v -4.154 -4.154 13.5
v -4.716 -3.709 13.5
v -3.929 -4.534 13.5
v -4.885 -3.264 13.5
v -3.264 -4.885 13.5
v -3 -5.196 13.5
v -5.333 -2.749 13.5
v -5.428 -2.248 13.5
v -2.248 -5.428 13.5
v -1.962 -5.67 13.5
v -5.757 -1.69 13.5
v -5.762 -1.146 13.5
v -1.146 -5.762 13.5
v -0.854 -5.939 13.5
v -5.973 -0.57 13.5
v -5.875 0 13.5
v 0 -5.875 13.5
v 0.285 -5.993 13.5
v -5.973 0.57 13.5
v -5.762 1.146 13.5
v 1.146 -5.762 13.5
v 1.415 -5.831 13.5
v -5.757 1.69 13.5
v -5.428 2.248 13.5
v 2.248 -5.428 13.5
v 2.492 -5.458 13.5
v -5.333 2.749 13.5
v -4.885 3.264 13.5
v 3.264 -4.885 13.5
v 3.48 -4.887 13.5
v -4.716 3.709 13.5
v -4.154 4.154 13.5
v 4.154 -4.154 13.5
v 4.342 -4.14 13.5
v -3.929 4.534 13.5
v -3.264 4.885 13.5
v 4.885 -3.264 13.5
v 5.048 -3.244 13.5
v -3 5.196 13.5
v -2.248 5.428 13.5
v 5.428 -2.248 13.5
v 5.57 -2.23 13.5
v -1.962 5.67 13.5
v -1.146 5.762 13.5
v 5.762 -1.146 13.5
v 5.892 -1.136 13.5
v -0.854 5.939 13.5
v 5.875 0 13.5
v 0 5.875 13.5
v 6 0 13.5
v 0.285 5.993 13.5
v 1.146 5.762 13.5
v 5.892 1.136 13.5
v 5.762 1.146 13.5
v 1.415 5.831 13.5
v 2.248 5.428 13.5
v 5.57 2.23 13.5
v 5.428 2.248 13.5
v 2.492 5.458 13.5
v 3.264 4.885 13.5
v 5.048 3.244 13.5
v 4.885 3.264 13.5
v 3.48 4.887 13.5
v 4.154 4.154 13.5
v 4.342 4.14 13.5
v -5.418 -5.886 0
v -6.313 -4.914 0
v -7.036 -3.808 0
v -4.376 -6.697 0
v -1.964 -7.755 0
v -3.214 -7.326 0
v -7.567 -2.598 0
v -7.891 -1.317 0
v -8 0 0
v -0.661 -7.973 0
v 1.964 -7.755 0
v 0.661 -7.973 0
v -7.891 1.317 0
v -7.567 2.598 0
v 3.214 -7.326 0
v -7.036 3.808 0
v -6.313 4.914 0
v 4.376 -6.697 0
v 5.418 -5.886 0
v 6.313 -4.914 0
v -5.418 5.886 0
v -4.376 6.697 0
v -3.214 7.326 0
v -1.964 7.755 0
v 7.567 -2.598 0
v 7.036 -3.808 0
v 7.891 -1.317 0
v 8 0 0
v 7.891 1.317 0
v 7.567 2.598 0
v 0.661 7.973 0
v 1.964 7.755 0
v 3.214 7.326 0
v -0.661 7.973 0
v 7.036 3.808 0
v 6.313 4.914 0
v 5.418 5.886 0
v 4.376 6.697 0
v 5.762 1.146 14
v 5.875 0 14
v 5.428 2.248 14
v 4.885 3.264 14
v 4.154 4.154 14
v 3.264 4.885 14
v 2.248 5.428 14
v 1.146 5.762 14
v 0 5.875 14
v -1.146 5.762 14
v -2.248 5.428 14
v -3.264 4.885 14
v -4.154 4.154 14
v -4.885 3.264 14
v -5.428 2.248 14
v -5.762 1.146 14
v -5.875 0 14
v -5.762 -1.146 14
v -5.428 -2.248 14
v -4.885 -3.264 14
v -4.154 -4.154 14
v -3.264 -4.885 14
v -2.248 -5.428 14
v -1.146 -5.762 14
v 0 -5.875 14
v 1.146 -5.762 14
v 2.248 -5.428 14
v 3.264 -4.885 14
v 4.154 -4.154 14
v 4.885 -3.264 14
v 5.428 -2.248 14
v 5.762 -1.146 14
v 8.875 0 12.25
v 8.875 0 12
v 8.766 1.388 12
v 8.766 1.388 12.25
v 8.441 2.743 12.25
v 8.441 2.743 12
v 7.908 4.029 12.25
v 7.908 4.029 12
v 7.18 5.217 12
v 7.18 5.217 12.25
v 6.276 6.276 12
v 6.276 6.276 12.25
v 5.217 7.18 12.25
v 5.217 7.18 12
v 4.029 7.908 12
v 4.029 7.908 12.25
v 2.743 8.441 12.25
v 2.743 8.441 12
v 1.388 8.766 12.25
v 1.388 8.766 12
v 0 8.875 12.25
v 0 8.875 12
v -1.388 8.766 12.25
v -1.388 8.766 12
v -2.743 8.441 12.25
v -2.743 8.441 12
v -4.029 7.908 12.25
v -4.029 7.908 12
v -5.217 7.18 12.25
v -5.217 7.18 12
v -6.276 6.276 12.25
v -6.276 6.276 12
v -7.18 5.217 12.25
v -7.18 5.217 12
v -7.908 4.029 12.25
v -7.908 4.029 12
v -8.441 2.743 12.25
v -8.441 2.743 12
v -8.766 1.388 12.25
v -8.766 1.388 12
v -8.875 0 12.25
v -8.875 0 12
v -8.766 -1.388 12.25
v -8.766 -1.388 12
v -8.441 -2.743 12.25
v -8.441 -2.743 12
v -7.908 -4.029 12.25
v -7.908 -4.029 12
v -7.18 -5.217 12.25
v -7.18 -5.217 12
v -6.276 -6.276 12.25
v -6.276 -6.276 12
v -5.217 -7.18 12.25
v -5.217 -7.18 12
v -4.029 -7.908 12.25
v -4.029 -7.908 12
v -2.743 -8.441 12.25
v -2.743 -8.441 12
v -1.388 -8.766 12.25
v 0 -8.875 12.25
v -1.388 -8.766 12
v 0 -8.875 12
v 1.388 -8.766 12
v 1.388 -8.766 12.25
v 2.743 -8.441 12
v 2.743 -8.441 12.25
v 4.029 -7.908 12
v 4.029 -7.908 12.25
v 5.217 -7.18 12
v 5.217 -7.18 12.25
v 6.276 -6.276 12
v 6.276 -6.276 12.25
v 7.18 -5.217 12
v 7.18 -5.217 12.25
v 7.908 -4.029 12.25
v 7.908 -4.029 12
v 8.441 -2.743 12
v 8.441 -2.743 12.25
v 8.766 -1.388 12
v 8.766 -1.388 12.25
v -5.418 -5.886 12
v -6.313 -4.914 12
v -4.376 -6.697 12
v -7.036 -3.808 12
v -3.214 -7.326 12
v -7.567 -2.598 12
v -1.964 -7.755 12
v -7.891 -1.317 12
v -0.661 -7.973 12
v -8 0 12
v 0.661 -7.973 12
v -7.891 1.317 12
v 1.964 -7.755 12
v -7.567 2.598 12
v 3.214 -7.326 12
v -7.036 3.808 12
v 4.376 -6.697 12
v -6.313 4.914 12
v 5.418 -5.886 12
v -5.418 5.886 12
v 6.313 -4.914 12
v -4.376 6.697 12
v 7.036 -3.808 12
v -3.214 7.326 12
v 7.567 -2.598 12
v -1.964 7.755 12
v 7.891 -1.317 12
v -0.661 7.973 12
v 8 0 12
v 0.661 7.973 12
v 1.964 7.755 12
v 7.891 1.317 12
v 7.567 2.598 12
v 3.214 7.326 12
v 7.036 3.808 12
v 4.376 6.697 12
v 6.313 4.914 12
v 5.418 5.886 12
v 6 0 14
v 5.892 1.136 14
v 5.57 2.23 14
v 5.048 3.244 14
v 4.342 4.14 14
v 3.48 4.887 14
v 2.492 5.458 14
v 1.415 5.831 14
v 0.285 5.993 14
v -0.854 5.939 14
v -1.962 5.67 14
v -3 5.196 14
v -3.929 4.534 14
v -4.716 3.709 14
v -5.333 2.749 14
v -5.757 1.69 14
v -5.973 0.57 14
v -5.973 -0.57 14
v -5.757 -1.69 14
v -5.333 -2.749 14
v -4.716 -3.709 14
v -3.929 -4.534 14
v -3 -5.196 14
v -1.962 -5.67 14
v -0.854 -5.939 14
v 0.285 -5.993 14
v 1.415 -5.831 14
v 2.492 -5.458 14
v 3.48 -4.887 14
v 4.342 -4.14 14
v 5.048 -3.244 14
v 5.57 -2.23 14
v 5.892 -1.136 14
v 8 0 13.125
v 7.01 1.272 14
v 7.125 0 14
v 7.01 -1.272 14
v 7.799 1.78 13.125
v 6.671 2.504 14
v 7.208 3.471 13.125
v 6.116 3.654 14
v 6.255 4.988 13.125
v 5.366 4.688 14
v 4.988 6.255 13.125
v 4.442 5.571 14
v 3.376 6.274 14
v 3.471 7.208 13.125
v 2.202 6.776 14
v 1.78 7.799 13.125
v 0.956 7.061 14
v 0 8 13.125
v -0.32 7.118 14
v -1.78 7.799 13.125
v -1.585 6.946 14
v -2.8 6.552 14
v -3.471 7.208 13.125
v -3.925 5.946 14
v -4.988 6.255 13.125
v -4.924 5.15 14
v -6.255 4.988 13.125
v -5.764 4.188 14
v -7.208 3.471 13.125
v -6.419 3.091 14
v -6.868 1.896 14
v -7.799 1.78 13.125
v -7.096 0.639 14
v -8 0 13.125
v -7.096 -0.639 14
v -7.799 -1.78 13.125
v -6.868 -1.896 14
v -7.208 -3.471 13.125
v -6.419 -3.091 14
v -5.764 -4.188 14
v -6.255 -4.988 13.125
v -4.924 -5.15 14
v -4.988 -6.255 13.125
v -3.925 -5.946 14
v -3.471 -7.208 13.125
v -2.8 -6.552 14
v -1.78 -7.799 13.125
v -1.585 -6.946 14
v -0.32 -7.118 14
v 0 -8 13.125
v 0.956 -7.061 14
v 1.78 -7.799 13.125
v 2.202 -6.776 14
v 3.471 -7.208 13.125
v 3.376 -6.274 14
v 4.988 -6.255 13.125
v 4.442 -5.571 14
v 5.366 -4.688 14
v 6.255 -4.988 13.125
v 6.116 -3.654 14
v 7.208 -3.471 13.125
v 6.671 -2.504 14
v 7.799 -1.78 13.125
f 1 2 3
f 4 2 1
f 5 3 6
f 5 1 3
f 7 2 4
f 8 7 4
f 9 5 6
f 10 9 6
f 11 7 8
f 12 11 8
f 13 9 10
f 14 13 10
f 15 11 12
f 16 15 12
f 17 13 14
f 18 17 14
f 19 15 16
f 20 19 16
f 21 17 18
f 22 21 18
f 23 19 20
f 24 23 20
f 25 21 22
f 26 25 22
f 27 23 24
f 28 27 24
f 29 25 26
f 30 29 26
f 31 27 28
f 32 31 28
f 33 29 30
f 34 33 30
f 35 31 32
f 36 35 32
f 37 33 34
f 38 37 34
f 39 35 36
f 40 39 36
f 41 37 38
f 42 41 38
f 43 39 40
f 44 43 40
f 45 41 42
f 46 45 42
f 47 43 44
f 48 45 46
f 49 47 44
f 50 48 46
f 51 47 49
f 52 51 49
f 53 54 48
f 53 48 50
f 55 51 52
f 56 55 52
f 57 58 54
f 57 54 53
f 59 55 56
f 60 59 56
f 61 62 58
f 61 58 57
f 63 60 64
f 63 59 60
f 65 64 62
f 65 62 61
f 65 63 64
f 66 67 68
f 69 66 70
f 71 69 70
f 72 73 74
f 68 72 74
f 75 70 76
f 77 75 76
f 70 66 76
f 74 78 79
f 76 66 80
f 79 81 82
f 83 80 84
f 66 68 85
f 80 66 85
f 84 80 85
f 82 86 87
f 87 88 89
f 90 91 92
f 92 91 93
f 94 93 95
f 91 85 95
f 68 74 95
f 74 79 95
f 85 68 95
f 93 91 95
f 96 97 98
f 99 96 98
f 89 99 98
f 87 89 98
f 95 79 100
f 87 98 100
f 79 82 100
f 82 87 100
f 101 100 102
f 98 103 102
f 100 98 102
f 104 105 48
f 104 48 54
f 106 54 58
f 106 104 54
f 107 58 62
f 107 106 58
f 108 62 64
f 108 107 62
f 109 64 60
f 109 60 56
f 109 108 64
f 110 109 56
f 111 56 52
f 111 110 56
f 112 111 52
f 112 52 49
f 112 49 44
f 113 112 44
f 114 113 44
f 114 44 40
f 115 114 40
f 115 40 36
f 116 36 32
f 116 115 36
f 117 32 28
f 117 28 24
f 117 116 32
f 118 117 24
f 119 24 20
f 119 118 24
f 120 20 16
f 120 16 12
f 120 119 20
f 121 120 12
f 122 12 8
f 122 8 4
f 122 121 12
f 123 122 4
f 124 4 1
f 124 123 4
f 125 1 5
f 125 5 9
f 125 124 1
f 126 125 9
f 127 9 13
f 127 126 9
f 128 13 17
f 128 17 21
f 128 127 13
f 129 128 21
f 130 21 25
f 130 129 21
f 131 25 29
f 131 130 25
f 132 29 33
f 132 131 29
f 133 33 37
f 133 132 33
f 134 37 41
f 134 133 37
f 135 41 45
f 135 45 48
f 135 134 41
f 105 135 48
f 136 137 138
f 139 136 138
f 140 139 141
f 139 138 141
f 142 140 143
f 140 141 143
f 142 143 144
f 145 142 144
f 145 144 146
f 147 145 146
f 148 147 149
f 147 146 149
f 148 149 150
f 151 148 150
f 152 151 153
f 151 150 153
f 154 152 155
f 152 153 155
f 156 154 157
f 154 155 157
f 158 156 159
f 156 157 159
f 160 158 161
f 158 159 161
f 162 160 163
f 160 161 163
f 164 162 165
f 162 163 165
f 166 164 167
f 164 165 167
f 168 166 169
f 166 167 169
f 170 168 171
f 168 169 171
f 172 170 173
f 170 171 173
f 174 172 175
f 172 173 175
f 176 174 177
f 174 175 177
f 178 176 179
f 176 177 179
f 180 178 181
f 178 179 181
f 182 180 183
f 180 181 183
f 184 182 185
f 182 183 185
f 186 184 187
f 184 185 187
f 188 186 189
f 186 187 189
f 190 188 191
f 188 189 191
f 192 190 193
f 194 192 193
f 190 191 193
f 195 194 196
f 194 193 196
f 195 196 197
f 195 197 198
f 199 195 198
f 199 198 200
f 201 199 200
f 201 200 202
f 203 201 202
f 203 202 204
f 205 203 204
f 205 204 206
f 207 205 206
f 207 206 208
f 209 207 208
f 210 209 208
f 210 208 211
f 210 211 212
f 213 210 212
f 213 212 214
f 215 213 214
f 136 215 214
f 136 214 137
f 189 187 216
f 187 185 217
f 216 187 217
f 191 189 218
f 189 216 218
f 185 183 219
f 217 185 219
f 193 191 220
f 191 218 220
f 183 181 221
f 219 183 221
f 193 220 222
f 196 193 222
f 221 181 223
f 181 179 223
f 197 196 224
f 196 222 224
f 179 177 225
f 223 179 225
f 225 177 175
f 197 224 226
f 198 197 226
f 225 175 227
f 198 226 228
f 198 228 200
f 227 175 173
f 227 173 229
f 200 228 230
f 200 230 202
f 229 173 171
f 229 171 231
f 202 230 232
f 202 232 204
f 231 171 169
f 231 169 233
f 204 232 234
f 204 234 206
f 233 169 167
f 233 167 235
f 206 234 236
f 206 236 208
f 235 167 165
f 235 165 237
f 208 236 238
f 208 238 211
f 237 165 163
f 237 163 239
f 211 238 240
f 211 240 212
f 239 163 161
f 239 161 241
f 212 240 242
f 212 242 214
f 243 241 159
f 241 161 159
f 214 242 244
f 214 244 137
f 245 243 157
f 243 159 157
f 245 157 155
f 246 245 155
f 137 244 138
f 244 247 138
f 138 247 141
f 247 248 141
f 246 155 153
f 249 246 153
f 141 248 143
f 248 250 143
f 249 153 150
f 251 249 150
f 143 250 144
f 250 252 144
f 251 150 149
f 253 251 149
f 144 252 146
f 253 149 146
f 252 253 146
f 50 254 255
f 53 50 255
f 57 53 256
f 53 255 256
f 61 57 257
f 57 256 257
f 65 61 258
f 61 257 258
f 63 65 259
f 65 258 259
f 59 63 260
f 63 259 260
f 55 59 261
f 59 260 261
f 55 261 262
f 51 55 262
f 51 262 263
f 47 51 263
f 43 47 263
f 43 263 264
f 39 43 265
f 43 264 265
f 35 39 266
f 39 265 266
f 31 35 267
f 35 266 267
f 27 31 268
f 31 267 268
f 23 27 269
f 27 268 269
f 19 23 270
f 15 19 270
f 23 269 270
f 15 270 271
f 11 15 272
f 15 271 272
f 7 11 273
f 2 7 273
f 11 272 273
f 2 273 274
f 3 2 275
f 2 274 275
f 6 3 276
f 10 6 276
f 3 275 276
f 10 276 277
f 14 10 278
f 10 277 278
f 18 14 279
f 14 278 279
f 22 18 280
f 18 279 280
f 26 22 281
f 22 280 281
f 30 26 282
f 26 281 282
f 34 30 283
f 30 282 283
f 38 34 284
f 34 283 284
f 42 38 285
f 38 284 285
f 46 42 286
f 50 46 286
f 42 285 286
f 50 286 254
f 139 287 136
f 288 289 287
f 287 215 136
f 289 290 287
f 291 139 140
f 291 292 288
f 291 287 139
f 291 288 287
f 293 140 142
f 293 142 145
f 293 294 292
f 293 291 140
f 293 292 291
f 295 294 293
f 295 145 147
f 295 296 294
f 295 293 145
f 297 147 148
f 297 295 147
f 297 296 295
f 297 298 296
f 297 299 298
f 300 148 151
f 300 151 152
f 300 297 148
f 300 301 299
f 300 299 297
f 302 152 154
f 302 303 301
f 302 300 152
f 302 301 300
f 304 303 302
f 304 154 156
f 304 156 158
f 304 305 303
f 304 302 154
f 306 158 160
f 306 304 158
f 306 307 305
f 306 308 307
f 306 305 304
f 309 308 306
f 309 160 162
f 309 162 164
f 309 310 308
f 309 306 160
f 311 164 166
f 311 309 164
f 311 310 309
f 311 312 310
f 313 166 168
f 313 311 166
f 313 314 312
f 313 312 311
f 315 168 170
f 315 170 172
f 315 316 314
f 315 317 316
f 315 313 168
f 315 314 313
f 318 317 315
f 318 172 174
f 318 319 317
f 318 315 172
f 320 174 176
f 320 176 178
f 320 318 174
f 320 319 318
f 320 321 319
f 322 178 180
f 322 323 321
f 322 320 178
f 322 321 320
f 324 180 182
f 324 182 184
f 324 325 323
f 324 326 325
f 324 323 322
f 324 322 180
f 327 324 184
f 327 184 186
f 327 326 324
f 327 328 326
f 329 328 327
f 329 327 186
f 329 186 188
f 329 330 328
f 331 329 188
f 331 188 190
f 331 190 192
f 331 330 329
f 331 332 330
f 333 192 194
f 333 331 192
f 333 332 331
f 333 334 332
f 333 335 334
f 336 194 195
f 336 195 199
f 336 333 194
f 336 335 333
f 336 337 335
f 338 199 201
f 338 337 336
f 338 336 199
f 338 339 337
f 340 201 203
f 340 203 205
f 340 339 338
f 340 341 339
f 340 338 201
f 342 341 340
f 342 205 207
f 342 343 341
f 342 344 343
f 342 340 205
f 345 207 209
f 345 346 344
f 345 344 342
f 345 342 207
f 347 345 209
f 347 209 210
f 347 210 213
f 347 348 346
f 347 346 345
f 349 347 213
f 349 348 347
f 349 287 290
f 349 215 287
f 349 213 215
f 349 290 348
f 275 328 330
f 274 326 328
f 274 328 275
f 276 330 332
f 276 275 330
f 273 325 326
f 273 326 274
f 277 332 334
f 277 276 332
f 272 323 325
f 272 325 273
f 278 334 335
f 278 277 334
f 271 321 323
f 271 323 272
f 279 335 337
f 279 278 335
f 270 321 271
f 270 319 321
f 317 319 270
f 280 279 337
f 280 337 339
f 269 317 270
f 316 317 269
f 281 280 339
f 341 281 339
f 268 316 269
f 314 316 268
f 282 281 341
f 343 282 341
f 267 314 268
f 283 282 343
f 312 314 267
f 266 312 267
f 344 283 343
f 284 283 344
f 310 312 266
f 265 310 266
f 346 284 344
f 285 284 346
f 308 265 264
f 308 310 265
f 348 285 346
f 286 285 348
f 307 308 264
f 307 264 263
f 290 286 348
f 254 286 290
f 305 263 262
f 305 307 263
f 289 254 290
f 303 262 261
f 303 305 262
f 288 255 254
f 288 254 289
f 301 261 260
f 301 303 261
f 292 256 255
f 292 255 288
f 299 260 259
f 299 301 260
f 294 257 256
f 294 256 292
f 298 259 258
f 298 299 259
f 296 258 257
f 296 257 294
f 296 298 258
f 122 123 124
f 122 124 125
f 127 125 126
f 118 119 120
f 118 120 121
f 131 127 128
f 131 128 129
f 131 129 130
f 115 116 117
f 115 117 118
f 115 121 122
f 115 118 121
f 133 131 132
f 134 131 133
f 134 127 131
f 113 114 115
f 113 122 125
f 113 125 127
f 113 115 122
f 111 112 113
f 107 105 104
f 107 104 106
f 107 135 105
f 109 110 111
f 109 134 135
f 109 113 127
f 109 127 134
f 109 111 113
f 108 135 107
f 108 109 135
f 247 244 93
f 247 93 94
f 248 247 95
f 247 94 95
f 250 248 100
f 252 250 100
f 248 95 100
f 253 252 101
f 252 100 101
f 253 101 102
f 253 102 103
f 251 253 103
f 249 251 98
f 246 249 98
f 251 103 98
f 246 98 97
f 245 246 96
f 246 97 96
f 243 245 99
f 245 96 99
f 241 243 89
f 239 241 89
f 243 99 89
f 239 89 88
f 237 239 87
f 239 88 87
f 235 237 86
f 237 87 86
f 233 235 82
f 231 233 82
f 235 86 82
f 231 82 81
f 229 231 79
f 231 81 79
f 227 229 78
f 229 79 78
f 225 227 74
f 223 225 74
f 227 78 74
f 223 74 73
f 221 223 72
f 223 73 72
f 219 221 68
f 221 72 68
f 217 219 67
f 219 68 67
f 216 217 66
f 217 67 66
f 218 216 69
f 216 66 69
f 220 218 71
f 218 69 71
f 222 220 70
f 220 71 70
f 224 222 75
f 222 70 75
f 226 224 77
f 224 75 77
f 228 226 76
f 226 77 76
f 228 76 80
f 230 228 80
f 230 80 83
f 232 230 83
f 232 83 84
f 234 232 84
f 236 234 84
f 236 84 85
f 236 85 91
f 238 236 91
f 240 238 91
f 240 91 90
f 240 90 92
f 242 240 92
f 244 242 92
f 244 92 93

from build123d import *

# Parameters (mm, degrees)
F0_R     = 8
F1_DEPTH = 12
F2_R     = 8.875
F2_R_2   = 8
F3_DEPTH = 2
F4_SIZE  = 1.75
F5_R     = 6
F5_R_2   = 5.875
F6_DEPTH = 0.5


with BuildPart() as f1:
    # F0 (on Top) → F1 (new body)
    with BuildSketch(Plane.XY):
        Circle(F0_R)
    extrude(amount=F1_DEPTH)

    # F2 (on face) → F3 (join)
    with BuildSketch(Plane.XY.offset(12)):
        Circle(F2_R)
        Circle(F2_R_2, mode=Mode.SUBTRACT)
        Circle(F2_R_2)
    extrude(amount=F3_DEPTH)

    # F4
    f4_edges = [f1.edges().sort_by_distance(p)[0] for p in [
        (-8.875, 0, 14),
    ]]
    chamfer(f4_edges, length=F4_SIZE)

    # F5 (on face) → F6 (cut)
    with BuildSketch(Plane.XY.offset(14)):
        Circle(F5_R)
        Circle(F5_R_2, mode=Mode.SUBTRACT)
    extrude(amount=-F6_DEPTH, mode=Mode.SUBTRACT)


solid = f1.part
